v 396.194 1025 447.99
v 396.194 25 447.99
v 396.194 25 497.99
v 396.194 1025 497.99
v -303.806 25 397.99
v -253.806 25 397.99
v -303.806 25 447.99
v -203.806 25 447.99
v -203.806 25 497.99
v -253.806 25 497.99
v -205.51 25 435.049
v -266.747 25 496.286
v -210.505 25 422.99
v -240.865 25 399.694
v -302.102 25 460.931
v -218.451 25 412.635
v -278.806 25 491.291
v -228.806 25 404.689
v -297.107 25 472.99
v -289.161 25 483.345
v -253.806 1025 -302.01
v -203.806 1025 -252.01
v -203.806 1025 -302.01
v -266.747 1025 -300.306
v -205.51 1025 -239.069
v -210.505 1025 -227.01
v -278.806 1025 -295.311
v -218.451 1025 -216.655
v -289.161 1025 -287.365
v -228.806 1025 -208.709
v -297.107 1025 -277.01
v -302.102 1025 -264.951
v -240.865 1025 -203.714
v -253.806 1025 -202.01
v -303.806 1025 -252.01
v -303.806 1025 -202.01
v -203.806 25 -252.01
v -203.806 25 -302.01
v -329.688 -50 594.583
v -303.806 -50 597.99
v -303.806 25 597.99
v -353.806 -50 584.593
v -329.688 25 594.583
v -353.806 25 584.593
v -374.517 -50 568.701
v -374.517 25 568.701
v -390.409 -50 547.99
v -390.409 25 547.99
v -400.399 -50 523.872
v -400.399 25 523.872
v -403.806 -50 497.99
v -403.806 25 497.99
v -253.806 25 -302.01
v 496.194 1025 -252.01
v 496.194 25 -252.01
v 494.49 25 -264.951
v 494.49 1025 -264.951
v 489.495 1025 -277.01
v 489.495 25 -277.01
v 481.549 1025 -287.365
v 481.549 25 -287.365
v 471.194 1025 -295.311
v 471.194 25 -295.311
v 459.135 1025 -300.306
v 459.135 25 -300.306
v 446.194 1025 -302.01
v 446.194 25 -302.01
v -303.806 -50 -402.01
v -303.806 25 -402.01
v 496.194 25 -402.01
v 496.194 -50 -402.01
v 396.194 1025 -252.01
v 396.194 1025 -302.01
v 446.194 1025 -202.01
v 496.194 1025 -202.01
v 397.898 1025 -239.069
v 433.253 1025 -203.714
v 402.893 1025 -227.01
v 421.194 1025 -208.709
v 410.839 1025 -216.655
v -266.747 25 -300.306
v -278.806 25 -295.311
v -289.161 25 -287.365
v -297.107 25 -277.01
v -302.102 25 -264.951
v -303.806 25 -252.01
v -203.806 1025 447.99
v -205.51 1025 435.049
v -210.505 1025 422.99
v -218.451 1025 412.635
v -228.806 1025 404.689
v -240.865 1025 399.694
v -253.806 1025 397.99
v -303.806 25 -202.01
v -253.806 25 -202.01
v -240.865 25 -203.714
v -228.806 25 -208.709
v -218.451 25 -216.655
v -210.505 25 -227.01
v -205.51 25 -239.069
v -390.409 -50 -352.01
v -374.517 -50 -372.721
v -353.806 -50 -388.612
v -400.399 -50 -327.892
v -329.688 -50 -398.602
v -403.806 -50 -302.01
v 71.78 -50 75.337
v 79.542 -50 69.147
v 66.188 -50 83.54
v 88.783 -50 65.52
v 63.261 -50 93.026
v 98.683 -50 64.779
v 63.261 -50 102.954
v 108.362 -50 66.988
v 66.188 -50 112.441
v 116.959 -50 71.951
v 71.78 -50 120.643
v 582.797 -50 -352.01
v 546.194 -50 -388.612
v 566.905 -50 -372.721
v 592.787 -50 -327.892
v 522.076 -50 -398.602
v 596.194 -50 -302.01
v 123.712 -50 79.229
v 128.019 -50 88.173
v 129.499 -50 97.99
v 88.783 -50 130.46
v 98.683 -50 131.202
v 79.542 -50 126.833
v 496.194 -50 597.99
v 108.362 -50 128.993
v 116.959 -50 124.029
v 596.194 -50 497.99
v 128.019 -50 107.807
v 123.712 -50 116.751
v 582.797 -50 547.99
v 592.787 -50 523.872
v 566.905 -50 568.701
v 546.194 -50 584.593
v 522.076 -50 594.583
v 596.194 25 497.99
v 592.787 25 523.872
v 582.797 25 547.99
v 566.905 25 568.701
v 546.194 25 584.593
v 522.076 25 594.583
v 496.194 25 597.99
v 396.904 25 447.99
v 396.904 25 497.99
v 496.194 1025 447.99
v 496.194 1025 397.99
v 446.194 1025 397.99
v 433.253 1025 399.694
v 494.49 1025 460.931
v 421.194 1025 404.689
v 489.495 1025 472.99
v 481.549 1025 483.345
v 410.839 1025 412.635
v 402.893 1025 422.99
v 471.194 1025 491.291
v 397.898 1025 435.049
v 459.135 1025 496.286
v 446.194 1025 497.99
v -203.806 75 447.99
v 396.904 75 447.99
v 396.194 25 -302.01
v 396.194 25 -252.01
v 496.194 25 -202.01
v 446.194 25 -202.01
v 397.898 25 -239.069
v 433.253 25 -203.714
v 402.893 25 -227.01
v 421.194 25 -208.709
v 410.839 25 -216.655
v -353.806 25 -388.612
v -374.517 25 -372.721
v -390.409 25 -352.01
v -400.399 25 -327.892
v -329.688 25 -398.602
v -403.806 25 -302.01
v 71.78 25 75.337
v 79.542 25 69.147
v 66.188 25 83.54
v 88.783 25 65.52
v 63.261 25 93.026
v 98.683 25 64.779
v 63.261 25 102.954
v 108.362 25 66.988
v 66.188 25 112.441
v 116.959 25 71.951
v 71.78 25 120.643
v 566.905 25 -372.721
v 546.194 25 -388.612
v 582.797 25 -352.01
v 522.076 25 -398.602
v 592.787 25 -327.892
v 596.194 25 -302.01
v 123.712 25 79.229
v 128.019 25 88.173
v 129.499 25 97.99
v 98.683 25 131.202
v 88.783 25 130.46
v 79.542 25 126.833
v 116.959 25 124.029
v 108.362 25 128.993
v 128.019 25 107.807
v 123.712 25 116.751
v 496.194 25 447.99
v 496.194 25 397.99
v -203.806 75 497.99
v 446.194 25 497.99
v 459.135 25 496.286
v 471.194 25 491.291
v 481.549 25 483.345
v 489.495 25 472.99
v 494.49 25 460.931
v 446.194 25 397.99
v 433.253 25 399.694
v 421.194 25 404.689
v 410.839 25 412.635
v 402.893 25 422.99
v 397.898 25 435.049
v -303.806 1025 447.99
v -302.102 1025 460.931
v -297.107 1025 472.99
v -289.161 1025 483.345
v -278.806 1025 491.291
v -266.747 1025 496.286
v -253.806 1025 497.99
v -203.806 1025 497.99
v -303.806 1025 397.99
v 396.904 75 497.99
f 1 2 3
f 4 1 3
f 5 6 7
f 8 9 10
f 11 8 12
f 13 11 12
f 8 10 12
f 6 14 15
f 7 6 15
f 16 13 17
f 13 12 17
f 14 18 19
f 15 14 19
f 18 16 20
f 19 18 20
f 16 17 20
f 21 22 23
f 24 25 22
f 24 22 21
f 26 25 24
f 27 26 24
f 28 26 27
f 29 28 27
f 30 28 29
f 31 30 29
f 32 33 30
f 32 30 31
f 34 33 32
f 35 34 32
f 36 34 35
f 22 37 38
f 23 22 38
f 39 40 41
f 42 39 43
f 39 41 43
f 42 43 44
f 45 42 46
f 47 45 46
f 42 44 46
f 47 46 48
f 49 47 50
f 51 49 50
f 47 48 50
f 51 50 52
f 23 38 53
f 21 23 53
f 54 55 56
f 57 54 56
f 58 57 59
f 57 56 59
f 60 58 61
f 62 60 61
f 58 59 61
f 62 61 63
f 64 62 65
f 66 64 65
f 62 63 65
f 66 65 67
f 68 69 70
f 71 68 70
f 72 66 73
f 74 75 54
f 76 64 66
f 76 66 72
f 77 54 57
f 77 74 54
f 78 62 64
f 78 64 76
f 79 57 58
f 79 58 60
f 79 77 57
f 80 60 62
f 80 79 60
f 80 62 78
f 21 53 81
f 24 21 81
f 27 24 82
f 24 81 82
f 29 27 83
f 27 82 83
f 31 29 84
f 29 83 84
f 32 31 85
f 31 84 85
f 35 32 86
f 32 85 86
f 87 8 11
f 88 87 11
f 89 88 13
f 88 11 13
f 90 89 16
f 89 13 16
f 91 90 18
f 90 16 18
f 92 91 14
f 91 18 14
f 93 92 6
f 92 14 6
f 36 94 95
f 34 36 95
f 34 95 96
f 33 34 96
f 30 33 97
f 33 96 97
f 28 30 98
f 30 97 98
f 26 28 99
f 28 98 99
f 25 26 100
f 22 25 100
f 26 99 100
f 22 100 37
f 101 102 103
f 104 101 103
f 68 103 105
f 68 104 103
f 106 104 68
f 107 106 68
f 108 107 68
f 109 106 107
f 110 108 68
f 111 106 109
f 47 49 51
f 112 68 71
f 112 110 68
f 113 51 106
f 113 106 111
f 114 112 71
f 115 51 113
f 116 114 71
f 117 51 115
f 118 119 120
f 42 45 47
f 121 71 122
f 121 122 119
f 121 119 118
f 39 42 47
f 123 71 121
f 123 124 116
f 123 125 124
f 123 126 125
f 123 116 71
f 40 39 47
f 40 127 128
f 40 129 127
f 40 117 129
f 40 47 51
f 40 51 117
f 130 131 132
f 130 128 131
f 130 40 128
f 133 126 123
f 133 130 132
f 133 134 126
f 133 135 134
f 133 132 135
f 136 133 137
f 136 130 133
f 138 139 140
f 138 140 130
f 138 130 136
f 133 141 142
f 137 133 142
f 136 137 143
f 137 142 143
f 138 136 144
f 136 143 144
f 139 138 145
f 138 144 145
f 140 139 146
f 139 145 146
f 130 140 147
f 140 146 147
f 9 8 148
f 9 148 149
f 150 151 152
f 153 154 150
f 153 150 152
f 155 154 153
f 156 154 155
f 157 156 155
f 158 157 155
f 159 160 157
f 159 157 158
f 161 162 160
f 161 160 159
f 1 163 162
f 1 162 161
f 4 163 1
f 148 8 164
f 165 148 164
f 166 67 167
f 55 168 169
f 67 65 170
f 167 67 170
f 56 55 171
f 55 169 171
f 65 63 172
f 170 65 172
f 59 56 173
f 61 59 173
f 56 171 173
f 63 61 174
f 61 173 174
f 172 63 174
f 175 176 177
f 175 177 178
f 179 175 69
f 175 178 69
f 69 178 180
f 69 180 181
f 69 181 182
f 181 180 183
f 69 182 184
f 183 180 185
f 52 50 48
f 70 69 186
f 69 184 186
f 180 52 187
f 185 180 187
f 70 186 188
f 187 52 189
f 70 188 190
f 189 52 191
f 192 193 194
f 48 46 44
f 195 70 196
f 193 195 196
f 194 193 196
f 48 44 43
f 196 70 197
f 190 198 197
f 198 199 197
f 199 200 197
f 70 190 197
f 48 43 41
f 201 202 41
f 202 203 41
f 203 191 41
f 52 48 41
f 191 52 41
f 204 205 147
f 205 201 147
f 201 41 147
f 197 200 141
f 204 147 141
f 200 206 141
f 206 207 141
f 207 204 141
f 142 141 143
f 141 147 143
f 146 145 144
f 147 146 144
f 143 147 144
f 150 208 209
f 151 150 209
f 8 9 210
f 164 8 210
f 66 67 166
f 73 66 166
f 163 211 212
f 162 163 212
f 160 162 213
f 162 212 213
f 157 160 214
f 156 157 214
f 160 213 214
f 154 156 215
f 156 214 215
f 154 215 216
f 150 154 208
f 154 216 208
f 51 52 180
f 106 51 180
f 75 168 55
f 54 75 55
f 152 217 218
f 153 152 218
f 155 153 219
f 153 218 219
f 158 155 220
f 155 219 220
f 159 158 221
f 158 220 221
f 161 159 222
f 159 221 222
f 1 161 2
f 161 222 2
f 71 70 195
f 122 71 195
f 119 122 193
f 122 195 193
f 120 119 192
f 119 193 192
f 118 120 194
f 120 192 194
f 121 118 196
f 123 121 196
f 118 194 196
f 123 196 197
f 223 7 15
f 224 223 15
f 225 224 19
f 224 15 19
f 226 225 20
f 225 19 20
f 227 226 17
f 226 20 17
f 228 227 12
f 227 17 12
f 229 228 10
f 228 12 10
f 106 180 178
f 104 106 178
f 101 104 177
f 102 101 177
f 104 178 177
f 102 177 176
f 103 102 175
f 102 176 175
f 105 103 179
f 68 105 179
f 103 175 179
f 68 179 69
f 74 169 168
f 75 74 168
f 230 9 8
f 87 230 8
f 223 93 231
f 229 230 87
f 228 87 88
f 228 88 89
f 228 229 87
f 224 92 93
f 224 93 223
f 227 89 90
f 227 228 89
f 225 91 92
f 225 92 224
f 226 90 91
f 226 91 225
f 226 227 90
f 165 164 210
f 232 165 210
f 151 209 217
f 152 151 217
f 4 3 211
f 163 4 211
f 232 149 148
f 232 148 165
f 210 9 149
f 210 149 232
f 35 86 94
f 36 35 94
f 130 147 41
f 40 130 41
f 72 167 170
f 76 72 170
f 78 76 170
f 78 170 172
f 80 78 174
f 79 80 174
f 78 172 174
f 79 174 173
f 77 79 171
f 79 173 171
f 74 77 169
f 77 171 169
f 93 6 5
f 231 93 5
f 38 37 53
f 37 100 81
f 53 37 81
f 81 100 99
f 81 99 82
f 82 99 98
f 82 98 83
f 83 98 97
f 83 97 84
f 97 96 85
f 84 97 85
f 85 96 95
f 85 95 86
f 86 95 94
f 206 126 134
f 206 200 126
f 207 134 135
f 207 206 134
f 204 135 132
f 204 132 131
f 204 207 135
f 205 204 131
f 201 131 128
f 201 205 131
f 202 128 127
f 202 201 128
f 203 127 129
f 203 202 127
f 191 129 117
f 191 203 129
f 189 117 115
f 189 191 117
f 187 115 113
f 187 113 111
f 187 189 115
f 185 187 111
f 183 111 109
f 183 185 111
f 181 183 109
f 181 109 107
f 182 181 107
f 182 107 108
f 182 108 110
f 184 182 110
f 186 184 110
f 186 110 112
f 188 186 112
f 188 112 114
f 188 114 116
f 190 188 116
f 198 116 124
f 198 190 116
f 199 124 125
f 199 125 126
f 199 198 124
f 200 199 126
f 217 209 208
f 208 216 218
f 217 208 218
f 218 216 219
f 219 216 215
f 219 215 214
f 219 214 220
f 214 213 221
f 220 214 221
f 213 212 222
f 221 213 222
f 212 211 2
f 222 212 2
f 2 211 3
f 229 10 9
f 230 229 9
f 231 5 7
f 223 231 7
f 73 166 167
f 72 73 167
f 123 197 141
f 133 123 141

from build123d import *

# Parameters (mm, degrees)
F0_R     = 33.304712
F1_DEPTH = 25
F3_DEPTH = 1000
F4_DEPTH = 50
F5_W     = 50.000002
F5_H     = 50
F6_DEPTH = 600.71


with BuildPart() as f1:
    # F0 (on Front) → F1 (new body, symmetric)
    with BuildSketch(Plane.XZ):
        with BuildLine():
            Line((496.194038, 597.990143), (-303.805962, 597.990143))
            ThreePointArc((-303.805962, 597.990143), (-374.51664, 568.700821), (-403.805962, 497.990143))
            Line((-403.805962, 497.990143), (-403.805962, -302.009857))
            ThreePointArc((-403.805962, -302.009857), (-374.51664, -372.720535), (-303.805962, -402.009857))
            Line((-303.805962, -402.009857), (496.194038, -402.009857))
            ThreePointArc((496.194038, -402.009857), (566.904716, -372.720535), (596.194038, -302.009857))
            Line((596.194038, -302.009857), (596.194038, 497.990143))
            ThreePointArc((596.194038, 497.990143), (566.904716, 568.700821), (496.194038, 597.990143))
        make_face()
        with Locations((96.194038, 97.990143)):
            Circle(F0_R, mode=Mode.SUBTRACT)
    extrude(amount=F1_DEPTH, both=True)

    # F0 (on Front) → F4 (join)
    with BuildSketch(Plane.XZ):
        with BuildLine():
            Line((496.194038, 597.990143), (-303.805962, 597.990143))
            ThreePointArc((-303.805962, 597.990143), (-374.51664, 568.700821), (-403.805962, 497.990143))
            Line((-403.805962, 497.990143), (-403.805962, -302.009857))
            ThreePointArc((-403.805962, -302.009857), (-374.51664, -372.720535), (-303.805962, -402.009857))
            Line((-303.805962, -402.009857), (496.194038, -402.009857))
            ThreePointArc((496.194038, -402.009857), (566.904716, -372.720535), (596.194038, -302.009857))
            Line((596.194038, -302.009857), (596.194038, 497.990143))
            ThreePointArc((596.194038, 497.990143), (566.904716, 568.700821), (496.194038, 597.990143))
        make_face()
        with Locations((96.194038, 97.990143)):
            Circle(F0_R, mode=Mode.SUBTRACT)
    extrude(amount=F4_DEPTH)


with BuildPart() as f3:
    # F2 (on face) → F3 (new body)
    with BuildSketch(Plane(origin=(0, 25, 0), x_dir=(-1, 0, 0), z_dir=(0, 1, 0))):
        with BuildLine():
            Line((-396.194038, 497.990143), (-446.194038, 497.990143))
            ThreePointArc((-446.194038, 497.990143), (-481.549377, 483.345482), (-496.194038, 447.990143))
            Line((-496.194038, 447.990143), (-496.194038, 397.990143))
            Line((-496.194038, 397.990143), (-396.194038, 497.990143))
        make_face()
        with BuildLine():
            ThreePointArc((303.805962, 447.990143), (289.161301, 483.345482), (253.805962, 497.990143))
            Line((253.805962, 497.990143), (203.805962, 497.990143))
            Line((203.805962, 497.990143), (303.805962, 397.990143))
            Line((303.805962, 397.990143), (303.805962, 447.990143))
        make_face()
        with BuildLine():
            Line((203.805962, -302.009857), (253.805962, -302.009857))
            ThreePointArc((253.805962, -302.009857), (289.161301, -287.365196), (303.805962, -252.009857))
            Line((303.805962, -252.009857), (303.805962, -202.009857))
            Line((303.805962, -202.009857), (203.805962, -302.009857))
        make_face()
        with BuildLine():
            ThreePointArc((-496.194038, -252.009857), (-481.549377, -287.365196), (-446.194038, -302.009857))
            Line((-446.194038, -302.009857), (-396.194038, -302.009857))
            Line((-396.194038, -302.009857), (-496.194038, -202.009857))
            Line((-496.194038, -202.009857), (-496.194038, -252.009857))
        make_face()
        with BuildLine():
            Line((203.805962, -252.009857), (203.805962, -302.009857))
            Line((203.805962, -302.009857), (303.805962, -202.009857))
            Line((303.805962, -202.009857), (253.805962, -202.009857))
            ThreePointArc((253.805962, -202.009857), (218.450623, -216.654518), (203.805962, -252.009857))
        make_face()
        with BuildLine():
            Line((-496.194038, -202.009857), (-396.194038, -302.009857))
            Line((-396.194038, -302.009857), (-396.194038, -252.009857))
            ThreePointArc((-396.194038, -252.009857), (-410.838699, -216.654518), (-446.194038, -202.009857))
            Line((-446.194038, -202.009857), (-496.194038, -202.009857))
        make_face()
        with BuildLine():
            Line((-396.194038, 447.990143), (-396.194038, 497.990143))
            Line((-396.194038, 497.990143), (-496.194038, 397.990143))
            Line((-496.194038, 397.990143), (-446.194038, 397.990143))
            ThreePointArc((-446.194038, 397.990143), (-410.838699, 412.634804), (-396.194038, 447.990143))
        make_face()
        with BuildLine():
            Line((303.805962, 397.990143), (203.805962, 497.990143))
            Line((203.805962, 497.990143), (203.805962, 447.990143))
            ThreePointArc((203.805962, 447.990143), (218.450623, 412.634804), (253.805962, 397.990143))
            Line((253.805962, 397.990143), (303.805962, 397.990143))
        make_face()
    extrude(amount=F3_DEPTH)


with BuildPart() as f6:
    # F5 (on face) → F6 (new body)
    with BuildSketch(Plane.YZ.offset(-203.805962)):
        with Locations((50.000001, 472.990143)):
            Rectangle(F5_W, F5_H)
    extrude(amount=F6_DEPTH)


solid = Compound([f1.part, f3.part, f6.part])
